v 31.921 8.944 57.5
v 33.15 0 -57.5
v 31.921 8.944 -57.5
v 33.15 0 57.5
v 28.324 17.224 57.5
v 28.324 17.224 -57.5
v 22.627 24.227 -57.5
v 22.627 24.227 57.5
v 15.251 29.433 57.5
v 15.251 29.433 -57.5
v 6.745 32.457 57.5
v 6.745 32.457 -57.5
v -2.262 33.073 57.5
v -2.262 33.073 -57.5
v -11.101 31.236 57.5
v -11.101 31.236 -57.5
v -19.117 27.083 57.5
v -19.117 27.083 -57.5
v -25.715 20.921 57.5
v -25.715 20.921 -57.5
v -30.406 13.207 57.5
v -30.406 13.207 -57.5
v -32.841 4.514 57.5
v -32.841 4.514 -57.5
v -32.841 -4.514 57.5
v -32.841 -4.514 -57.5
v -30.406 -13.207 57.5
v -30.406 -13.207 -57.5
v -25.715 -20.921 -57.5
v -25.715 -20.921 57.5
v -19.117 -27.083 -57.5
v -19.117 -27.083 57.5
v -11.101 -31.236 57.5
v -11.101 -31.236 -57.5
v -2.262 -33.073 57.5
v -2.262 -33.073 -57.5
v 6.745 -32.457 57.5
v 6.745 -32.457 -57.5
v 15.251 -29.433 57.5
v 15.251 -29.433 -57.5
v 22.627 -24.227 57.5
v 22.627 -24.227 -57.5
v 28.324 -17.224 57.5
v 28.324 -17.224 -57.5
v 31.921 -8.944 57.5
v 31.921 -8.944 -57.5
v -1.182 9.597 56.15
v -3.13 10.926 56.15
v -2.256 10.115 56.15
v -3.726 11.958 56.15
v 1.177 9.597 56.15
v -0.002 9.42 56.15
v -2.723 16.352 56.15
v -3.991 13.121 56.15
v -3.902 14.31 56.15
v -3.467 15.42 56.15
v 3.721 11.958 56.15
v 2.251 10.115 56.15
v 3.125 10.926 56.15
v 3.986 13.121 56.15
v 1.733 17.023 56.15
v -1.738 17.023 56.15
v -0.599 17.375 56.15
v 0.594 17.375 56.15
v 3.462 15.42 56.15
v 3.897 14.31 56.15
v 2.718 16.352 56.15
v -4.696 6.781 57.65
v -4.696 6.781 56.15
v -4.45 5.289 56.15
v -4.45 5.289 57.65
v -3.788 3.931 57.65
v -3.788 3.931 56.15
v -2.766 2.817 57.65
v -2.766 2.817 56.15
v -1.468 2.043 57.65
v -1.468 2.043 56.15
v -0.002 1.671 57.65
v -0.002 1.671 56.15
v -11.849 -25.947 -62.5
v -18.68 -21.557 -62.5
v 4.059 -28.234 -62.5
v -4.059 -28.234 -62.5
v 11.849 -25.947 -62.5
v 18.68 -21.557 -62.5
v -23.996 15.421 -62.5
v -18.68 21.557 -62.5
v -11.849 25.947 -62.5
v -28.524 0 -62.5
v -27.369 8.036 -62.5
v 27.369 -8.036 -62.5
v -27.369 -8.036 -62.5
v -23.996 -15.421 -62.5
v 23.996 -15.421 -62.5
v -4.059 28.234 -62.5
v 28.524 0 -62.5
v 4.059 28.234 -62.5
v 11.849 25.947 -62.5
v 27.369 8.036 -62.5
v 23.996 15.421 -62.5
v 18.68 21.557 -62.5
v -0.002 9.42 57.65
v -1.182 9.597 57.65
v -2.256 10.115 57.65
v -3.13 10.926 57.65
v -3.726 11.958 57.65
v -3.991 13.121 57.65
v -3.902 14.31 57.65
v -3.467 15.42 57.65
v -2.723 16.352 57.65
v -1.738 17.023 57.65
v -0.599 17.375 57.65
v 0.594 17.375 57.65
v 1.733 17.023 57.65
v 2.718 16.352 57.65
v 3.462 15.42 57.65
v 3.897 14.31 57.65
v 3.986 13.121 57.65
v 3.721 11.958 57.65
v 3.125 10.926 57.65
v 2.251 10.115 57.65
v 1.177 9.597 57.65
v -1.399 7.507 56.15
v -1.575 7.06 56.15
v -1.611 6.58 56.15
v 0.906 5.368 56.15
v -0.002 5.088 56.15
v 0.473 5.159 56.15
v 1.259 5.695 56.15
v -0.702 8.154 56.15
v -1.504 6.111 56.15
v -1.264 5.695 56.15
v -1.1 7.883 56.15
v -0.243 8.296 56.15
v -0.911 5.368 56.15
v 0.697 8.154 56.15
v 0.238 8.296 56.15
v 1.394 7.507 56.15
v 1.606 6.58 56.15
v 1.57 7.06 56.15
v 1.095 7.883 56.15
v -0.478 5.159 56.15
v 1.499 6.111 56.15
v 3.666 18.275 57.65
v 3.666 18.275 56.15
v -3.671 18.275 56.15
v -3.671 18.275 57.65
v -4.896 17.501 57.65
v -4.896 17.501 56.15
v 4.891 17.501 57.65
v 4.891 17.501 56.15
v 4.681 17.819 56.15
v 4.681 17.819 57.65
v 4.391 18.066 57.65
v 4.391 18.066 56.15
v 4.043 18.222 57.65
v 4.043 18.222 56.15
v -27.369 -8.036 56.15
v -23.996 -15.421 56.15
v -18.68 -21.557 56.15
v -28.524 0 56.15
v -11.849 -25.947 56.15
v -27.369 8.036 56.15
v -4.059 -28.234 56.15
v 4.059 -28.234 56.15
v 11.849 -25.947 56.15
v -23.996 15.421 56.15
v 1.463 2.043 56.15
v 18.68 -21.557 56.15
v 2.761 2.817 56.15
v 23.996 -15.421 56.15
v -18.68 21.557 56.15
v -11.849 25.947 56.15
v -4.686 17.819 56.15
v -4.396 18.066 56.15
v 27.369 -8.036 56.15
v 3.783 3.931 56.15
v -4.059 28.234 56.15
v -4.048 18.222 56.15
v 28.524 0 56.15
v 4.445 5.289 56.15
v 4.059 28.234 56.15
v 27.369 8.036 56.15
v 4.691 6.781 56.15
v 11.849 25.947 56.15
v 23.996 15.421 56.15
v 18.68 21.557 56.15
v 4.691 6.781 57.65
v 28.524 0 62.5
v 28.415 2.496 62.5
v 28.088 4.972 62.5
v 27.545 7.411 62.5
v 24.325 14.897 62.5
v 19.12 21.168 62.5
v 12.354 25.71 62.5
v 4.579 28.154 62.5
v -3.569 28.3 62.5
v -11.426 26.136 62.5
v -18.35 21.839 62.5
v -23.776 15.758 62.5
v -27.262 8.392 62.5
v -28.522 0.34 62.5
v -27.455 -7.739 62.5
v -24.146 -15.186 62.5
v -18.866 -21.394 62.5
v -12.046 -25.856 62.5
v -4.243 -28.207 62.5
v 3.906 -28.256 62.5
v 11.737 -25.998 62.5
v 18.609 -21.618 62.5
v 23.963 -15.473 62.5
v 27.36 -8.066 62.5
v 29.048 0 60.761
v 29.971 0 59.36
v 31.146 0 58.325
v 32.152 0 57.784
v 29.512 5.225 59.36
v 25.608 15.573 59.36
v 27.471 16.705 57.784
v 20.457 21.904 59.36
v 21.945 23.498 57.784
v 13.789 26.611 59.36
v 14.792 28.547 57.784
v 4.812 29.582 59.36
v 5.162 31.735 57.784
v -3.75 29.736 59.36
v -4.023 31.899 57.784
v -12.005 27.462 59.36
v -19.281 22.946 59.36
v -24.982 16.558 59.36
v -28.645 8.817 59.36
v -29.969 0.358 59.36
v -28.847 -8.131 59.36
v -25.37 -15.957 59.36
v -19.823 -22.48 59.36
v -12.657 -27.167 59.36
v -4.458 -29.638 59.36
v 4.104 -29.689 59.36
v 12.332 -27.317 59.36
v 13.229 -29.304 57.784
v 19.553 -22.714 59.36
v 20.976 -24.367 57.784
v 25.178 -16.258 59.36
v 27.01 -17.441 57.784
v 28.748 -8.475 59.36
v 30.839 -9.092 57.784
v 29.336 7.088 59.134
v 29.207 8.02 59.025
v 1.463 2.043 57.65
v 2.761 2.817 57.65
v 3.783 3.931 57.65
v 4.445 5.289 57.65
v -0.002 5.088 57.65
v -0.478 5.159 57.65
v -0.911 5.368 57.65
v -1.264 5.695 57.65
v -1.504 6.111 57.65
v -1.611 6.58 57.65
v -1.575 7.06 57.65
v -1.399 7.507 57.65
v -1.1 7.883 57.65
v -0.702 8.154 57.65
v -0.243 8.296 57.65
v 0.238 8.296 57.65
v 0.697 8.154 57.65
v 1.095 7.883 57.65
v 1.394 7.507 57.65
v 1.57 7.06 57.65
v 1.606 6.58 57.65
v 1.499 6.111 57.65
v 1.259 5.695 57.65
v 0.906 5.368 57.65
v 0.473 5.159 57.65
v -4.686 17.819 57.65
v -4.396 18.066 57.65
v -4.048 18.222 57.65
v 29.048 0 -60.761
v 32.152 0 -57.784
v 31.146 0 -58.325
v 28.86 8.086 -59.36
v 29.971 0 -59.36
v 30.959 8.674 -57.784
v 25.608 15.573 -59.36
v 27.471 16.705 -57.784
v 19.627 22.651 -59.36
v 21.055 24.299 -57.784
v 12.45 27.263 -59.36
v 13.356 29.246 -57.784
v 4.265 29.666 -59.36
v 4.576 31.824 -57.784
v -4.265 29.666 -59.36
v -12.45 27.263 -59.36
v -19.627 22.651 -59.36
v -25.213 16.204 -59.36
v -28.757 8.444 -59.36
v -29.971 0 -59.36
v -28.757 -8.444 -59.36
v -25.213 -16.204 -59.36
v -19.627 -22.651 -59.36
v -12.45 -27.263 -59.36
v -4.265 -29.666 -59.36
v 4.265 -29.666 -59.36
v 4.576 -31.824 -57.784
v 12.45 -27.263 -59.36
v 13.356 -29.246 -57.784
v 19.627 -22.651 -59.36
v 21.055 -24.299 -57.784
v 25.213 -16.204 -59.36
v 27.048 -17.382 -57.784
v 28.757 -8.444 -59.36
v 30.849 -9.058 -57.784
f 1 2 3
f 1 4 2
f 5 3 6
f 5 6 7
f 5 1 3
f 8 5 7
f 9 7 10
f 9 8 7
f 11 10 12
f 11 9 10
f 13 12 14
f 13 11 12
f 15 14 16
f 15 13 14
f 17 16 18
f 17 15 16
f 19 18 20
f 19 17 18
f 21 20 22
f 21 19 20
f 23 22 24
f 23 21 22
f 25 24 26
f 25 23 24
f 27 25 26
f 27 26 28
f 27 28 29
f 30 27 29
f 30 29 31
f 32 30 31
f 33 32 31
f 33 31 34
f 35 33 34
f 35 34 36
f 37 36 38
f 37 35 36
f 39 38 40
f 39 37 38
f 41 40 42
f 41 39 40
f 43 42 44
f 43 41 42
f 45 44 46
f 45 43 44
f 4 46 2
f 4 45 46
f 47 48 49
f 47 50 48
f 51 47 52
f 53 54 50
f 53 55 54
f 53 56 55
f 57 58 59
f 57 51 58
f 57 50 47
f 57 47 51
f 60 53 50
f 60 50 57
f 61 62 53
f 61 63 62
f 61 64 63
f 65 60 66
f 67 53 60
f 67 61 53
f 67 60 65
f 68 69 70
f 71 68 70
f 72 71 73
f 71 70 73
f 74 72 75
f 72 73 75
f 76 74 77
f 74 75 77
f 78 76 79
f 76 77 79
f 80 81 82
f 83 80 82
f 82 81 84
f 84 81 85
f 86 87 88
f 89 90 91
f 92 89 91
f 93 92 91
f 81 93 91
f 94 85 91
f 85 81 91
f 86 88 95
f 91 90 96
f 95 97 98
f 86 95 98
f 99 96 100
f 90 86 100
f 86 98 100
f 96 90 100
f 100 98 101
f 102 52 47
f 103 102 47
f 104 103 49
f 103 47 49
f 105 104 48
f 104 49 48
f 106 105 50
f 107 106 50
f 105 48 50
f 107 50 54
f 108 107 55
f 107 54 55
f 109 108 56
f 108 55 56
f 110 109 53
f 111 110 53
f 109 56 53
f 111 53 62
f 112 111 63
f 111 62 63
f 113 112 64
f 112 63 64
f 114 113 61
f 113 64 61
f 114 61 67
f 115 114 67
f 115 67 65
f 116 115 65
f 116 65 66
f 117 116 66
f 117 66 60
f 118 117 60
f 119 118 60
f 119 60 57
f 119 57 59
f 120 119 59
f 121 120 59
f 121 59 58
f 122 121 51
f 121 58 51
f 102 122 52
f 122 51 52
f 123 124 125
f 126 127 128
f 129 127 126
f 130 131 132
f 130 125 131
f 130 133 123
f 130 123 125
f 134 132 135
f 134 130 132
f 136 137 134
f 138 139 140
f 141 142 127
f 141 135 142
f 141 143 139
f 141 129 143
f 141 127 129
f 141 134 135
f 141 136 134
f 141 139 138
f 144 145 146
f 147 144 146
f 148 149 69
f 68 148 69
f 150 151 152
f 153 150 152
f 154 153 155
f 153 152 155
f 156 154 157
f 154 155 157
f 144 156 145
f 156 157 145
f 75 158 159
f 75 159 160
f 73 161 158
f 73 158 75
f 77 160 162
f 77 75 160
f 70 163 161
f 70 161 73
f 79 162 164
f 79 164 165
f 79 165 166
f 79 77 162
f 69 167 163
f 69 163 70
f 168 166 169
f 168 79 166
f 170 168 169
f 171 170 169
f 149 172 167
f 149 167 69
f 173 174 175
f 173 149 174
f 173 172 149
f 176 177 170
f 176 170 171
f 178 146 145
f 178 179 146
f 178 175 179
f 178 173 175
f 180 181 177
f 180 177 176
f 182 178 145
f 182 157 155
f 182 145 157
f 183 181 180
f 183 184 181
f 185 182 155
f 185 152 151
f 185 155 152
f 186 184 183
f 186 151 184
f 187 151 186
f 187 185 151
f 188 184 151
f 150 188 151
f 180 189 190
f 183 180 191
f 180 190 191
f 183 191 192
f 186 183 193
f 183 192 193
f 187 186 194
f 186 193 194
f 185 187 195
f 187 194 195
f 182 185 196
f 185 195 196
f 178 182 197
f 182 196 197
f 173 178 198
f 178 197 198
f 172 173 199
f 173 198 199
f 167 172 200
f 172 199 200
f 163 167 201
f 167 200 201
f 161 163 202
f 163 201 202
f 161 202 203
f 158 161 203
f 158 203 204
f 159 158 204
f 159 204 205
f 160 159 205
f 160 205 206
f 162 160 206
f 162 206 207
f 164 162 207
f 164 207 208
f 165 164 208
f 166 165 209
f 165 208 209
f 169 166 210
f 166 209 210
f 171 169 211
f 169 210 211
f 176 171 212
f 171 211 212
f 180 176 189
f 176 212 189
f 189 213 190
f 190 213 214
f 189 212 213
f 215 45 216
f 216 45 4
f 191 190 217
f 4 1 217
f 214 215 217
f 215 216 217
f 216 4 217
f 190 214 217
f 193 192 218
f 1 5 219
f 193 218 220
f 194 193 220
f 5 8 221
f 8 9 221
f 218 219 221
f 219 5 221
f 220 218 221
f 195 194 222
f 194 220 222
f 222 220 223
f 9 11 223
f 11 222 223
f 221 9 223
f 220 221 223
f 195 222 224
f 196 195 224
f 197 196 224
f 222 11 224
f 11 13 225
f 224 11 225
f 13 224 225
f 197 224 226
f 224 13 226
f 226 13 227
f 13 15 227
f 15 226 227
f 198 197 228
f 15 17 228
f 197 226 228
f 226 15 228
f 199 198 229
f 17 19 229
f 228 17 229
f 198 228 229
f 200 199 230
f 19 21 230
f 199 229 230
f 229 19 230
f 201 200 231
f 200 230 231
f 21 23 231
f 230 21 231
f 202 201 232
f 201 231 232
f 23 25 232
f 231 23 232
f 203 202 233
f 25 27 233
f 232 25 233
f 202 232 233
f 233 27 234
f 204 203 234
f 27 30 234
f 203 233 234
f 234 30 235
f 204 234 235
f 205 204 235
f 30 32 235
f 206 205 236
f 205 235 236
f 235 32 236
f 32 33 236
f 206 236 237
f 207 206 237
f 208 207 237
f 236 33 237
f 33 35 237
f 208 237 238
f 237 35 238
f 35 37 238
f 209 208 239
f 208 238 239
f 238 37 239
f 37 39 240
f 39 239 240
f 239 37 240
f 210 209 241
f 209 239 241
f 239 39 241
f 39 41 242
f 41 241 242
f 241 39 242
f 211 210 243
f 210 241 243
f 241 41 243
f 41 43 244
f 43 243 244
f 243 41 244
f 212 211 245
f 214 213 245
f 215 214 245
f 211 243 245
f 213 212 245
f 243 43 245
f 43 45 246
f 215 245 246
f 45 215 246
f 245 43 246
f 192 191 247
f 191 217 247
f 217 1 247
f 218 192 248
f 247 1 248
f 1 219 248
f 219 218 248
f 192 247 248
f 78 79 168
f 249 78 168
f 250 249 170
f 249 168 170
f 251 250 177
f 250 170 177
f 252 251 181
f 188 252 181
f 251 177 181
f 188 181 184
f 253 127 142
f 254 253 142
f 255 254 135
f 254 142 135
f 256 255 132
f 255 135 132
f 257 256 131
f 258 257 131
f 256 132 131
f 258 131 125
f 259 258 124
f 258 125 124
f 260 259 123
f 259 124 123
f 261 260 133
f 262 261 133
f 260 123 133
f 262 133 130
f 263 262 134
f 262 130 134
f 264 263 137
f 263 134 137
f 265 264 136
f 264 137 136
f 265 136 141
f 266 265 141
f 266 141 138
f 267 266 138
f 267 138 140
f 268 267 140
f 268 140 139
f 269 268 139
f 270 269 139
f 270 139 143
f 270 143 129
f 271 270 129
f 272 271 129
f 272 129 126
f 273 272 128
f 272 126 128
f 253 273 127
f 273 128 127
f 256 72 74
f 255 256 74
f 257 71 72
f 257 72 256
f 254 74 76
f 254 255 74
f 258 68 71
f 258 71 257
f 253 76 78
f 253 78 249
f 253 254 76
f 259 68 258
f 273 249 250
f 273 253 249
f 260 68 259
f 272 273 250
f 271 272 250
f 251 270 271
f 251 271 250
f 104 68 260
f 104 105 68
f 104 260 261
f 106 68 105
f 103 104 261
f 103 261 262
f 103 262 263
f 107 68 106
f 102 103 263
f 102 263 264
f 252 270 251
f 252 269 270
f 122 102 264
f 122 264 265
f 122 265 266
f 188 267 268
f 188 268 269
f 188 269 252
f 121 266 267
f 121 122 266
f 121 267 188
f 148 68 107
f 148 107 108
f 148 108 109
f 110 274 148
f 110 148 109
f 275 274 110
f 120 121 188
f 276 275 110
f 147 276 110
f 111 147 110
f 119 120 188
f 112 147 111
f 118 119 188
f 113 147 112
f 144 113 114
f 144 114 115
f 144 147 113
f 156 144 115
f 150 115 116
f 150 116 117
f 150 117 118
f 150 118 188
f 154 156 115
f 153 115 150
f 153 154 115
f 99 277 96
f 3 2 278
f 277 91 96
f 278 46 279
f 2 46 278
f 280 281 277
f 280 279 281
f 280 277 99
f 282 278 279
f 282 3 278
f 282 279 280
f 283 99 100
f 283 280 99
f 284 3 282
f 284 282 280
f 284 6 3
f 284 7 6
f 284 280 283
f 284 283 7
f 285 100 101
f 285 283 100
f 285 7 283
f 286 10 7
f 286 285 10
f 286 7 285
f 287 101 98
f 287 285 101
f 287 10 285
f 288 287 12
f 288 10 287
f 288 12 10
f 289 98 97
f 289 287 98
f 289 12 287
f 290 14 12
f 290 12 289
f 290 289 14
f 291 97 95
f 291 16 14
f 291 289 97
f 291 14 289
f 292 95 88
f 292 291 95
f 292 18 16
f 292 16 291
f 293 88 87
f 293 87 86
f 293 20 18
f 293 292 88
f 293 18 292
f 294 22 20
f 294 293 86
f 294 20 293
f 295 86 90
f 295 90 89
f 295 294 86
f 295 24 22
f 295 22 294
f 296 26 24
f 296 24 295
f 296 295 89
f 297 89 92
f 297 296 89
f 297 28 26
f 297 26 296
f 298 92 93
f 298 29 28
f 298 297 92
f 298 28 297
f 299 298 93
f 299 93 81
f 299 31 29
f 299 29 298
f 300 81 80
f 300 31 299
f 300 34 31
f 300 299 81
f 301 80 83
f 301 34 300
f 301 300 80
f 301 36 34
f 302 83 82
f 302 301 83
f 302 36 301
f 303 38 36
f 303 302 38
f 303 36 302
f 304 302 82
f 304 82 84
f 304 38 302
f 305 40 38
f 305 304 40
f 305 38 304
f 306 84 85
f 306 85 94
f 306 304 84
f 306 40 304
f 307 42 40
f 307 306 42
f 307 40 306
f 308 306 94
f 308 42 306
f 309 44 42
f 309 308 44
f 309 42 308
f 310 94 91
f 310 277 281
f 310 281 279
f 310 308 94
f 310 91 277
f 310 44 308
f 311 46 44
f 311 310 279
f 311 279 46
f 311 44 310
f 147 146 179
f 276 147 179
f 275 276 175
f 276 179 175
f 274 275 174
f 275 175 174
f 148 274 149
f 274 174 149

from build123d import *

# Parameters (mm, degrees)
F0_R      = 33.15
F1_DEPTH  = 57.5
F3_DEPTH  = 5
F8_DEPTH  = 5
F9_DEPTH  = 3.048
F10_R     = 28.5244197483
F11_DEPTH = 6.35
F14_DEPTH = 1.5


# Not quite as in the source:
# - a feature names something its author has since deleted; it is built from what else it names


with BuildPart() as f1:
    # F0 (on Top) → F1 (new body, symmetric)
    with BuildSketch(Plane.XY):
        Circle(F0_R)
    extrude(amount=F1_DEPTH, both=True)

    # F2 (on face) → F3 (join)
    with BuildSketch(Plane.XY.offset(57.5)):
        with BuildLine():
            ThreePointArc((27.5449306971, 7.4107567004), (-28.2784872926, -3.7376032987), (28.5244197483, 0))
            ThreePointArc((28.5244197483, 0), (28.2784872926, 3.7376032987), (27.5449306971, 7.4107567004))
        make_face()
        with BuildLine():
            Line((-3.6688328255, 16.6036896408), (0, 16.6036896408))
            Line((0, 16.6036896408), (3.6688328255, 16.6036896408))
            ThreePointArc((3.6688328255, 16.6036896408), (4.3933325809, 16.3940702991), (4.8939753324, 15.8299807676))
            Line((4.8939753324, 15.8299807676), (4.6938681044, 5.1092766225))
            ThreePointArc((4.6938681044, 5.1092766225), (3.3149072999, 1.6653658978), (0, 0))
            ThreePointArc((0, 0), (-3.3149072999, 1.6653658978), (-4.6938681044, 5.1092766225))
            Line((-4.6938681044, 5.1092766225), (-4.8939753324, 15.8299807676))
            ThreePointArc((-4.8939753324, 15.8299807676), (-4.3933325809, 16.3940702991), (-3.6688328255, 16.6036896408))
        make_face(mode=Mode.SUBTRACT)
    extrude(amount=F3_DEPTH)

    # F7: F6 across plane


with BuildPart() as f6:
    # F4 (on Front) → F6 (revolve)
    with BuildSketch(Plane.XZ):
        with BuildLine():
            add(Edge.make_bspline(
                [(28.5244197483, 62.5), (28.9434660226, 59.606384486), (31.2671773136, 57.7946938574), (33.15, 57.5)],
                knots=[0, 0, 0, 0, 6.8114603915, 6.8114603915, 6.8114603915, 6.8114603915], degree=3))
            Line((28.5244197483, 62.5), (28.5244197483, 57.5))
            Line((28.5244197483, 57.5), (33.15, 57.5))
        make_face()
    revolve(axis=Axis((0, 0, 67.1579949558), (0, 0, 1)))


with BuildPart() as f1_1:
    add(f1.part)
    add(f6.part.mirror(Plane.XY))

    # F8 (add): a face of the model
    f8_faces = [f1_1.faces().sort_by_distance(p)[0] for p in [
        (0, 0, -57.5),
    ]]
    extrude(f8_faces, amount=F8_DEPTH)

    # F9 (add): a face of the model
    f9_faces = [f1_1.faces().sort_by_distance(p)[0] for p in [
        (0, -0.5407612008, 62.5),
    ]]

    add(f6.part)  # F9 merges F6
    extrude(f9_faces, amount=-F9_DEPTH)

    # F10 (on face) → F11 (cut)
    with BuildSketch(Plane.XY.offset(62.5)):
        Circle(F10_R)
    extrude(amount=-F11_DEPTH, mode=Mode.SUBTRACT)

    # F13 (on face) → F14 (join)
    with BuildSketch(Plane.XY.offset(56.15)):
        with BuildLine():
            Line((3.6663445585, 18.275173819), (-0.002488267, 18.275173819))
            Line((-0.002488267, 18.275173819), (-3.6713210925, 18.275173819))
            ThreePointArc((-3.6713210925, 18.275173819), (-4.395820848, 18.0655544773), (-4.8964635994, 17.5014649459))
            Line((-4.8964635994, 17.5014649459), (-4.6963563714, 6.7807608008))
            ThreePointArc((-4.6963563714, 6.7807608008), (-3.3173955669, 3.336850076), (-0.002488267, 1.6714841783))
            ThreePointArc((-0.002488267, 1.6714841783), (3.3124190329, 3.336850076), (4.6913798374, 6.7807608008))
            Line((4.6913798374, 6.7807608008), (4.8914870654, 17.5014649459))
            ThreePointArc((4.8914870654, 17.5014649459), (4.3908443139, 18.0655544773), (3.6663445585, 18.275173819))
        make_face()
        with BuildLine():
            ThreePointArc((-0.002488267, 8.3136439422), (1.6104378587, 6.7007178165), (-0.002488267, 5.0877916907))
            ThreePointArc((-0.002488267, 5.0877916907), (-1.6154143928, 6.7007178165), (-0.002488267, 8.3136439422))
        make_face(mode=Mode.SUBTRACT)
        with BuildLine():
            ThreePointArc((-0.002488267, 17.4195373118), (3.997511733, 13.4195373118), (-0.002488267, 9.4195373118))
            ThreePointArc((-0.002488267, 9.4195373118), (-4.002488267, 13.4195373118), (-0.002488267, 17.4195373118))
        make_face(mode=Mode.SUBTRACT)
    extrude(amount=F14_DEPTH)


solid = f1_1.part
